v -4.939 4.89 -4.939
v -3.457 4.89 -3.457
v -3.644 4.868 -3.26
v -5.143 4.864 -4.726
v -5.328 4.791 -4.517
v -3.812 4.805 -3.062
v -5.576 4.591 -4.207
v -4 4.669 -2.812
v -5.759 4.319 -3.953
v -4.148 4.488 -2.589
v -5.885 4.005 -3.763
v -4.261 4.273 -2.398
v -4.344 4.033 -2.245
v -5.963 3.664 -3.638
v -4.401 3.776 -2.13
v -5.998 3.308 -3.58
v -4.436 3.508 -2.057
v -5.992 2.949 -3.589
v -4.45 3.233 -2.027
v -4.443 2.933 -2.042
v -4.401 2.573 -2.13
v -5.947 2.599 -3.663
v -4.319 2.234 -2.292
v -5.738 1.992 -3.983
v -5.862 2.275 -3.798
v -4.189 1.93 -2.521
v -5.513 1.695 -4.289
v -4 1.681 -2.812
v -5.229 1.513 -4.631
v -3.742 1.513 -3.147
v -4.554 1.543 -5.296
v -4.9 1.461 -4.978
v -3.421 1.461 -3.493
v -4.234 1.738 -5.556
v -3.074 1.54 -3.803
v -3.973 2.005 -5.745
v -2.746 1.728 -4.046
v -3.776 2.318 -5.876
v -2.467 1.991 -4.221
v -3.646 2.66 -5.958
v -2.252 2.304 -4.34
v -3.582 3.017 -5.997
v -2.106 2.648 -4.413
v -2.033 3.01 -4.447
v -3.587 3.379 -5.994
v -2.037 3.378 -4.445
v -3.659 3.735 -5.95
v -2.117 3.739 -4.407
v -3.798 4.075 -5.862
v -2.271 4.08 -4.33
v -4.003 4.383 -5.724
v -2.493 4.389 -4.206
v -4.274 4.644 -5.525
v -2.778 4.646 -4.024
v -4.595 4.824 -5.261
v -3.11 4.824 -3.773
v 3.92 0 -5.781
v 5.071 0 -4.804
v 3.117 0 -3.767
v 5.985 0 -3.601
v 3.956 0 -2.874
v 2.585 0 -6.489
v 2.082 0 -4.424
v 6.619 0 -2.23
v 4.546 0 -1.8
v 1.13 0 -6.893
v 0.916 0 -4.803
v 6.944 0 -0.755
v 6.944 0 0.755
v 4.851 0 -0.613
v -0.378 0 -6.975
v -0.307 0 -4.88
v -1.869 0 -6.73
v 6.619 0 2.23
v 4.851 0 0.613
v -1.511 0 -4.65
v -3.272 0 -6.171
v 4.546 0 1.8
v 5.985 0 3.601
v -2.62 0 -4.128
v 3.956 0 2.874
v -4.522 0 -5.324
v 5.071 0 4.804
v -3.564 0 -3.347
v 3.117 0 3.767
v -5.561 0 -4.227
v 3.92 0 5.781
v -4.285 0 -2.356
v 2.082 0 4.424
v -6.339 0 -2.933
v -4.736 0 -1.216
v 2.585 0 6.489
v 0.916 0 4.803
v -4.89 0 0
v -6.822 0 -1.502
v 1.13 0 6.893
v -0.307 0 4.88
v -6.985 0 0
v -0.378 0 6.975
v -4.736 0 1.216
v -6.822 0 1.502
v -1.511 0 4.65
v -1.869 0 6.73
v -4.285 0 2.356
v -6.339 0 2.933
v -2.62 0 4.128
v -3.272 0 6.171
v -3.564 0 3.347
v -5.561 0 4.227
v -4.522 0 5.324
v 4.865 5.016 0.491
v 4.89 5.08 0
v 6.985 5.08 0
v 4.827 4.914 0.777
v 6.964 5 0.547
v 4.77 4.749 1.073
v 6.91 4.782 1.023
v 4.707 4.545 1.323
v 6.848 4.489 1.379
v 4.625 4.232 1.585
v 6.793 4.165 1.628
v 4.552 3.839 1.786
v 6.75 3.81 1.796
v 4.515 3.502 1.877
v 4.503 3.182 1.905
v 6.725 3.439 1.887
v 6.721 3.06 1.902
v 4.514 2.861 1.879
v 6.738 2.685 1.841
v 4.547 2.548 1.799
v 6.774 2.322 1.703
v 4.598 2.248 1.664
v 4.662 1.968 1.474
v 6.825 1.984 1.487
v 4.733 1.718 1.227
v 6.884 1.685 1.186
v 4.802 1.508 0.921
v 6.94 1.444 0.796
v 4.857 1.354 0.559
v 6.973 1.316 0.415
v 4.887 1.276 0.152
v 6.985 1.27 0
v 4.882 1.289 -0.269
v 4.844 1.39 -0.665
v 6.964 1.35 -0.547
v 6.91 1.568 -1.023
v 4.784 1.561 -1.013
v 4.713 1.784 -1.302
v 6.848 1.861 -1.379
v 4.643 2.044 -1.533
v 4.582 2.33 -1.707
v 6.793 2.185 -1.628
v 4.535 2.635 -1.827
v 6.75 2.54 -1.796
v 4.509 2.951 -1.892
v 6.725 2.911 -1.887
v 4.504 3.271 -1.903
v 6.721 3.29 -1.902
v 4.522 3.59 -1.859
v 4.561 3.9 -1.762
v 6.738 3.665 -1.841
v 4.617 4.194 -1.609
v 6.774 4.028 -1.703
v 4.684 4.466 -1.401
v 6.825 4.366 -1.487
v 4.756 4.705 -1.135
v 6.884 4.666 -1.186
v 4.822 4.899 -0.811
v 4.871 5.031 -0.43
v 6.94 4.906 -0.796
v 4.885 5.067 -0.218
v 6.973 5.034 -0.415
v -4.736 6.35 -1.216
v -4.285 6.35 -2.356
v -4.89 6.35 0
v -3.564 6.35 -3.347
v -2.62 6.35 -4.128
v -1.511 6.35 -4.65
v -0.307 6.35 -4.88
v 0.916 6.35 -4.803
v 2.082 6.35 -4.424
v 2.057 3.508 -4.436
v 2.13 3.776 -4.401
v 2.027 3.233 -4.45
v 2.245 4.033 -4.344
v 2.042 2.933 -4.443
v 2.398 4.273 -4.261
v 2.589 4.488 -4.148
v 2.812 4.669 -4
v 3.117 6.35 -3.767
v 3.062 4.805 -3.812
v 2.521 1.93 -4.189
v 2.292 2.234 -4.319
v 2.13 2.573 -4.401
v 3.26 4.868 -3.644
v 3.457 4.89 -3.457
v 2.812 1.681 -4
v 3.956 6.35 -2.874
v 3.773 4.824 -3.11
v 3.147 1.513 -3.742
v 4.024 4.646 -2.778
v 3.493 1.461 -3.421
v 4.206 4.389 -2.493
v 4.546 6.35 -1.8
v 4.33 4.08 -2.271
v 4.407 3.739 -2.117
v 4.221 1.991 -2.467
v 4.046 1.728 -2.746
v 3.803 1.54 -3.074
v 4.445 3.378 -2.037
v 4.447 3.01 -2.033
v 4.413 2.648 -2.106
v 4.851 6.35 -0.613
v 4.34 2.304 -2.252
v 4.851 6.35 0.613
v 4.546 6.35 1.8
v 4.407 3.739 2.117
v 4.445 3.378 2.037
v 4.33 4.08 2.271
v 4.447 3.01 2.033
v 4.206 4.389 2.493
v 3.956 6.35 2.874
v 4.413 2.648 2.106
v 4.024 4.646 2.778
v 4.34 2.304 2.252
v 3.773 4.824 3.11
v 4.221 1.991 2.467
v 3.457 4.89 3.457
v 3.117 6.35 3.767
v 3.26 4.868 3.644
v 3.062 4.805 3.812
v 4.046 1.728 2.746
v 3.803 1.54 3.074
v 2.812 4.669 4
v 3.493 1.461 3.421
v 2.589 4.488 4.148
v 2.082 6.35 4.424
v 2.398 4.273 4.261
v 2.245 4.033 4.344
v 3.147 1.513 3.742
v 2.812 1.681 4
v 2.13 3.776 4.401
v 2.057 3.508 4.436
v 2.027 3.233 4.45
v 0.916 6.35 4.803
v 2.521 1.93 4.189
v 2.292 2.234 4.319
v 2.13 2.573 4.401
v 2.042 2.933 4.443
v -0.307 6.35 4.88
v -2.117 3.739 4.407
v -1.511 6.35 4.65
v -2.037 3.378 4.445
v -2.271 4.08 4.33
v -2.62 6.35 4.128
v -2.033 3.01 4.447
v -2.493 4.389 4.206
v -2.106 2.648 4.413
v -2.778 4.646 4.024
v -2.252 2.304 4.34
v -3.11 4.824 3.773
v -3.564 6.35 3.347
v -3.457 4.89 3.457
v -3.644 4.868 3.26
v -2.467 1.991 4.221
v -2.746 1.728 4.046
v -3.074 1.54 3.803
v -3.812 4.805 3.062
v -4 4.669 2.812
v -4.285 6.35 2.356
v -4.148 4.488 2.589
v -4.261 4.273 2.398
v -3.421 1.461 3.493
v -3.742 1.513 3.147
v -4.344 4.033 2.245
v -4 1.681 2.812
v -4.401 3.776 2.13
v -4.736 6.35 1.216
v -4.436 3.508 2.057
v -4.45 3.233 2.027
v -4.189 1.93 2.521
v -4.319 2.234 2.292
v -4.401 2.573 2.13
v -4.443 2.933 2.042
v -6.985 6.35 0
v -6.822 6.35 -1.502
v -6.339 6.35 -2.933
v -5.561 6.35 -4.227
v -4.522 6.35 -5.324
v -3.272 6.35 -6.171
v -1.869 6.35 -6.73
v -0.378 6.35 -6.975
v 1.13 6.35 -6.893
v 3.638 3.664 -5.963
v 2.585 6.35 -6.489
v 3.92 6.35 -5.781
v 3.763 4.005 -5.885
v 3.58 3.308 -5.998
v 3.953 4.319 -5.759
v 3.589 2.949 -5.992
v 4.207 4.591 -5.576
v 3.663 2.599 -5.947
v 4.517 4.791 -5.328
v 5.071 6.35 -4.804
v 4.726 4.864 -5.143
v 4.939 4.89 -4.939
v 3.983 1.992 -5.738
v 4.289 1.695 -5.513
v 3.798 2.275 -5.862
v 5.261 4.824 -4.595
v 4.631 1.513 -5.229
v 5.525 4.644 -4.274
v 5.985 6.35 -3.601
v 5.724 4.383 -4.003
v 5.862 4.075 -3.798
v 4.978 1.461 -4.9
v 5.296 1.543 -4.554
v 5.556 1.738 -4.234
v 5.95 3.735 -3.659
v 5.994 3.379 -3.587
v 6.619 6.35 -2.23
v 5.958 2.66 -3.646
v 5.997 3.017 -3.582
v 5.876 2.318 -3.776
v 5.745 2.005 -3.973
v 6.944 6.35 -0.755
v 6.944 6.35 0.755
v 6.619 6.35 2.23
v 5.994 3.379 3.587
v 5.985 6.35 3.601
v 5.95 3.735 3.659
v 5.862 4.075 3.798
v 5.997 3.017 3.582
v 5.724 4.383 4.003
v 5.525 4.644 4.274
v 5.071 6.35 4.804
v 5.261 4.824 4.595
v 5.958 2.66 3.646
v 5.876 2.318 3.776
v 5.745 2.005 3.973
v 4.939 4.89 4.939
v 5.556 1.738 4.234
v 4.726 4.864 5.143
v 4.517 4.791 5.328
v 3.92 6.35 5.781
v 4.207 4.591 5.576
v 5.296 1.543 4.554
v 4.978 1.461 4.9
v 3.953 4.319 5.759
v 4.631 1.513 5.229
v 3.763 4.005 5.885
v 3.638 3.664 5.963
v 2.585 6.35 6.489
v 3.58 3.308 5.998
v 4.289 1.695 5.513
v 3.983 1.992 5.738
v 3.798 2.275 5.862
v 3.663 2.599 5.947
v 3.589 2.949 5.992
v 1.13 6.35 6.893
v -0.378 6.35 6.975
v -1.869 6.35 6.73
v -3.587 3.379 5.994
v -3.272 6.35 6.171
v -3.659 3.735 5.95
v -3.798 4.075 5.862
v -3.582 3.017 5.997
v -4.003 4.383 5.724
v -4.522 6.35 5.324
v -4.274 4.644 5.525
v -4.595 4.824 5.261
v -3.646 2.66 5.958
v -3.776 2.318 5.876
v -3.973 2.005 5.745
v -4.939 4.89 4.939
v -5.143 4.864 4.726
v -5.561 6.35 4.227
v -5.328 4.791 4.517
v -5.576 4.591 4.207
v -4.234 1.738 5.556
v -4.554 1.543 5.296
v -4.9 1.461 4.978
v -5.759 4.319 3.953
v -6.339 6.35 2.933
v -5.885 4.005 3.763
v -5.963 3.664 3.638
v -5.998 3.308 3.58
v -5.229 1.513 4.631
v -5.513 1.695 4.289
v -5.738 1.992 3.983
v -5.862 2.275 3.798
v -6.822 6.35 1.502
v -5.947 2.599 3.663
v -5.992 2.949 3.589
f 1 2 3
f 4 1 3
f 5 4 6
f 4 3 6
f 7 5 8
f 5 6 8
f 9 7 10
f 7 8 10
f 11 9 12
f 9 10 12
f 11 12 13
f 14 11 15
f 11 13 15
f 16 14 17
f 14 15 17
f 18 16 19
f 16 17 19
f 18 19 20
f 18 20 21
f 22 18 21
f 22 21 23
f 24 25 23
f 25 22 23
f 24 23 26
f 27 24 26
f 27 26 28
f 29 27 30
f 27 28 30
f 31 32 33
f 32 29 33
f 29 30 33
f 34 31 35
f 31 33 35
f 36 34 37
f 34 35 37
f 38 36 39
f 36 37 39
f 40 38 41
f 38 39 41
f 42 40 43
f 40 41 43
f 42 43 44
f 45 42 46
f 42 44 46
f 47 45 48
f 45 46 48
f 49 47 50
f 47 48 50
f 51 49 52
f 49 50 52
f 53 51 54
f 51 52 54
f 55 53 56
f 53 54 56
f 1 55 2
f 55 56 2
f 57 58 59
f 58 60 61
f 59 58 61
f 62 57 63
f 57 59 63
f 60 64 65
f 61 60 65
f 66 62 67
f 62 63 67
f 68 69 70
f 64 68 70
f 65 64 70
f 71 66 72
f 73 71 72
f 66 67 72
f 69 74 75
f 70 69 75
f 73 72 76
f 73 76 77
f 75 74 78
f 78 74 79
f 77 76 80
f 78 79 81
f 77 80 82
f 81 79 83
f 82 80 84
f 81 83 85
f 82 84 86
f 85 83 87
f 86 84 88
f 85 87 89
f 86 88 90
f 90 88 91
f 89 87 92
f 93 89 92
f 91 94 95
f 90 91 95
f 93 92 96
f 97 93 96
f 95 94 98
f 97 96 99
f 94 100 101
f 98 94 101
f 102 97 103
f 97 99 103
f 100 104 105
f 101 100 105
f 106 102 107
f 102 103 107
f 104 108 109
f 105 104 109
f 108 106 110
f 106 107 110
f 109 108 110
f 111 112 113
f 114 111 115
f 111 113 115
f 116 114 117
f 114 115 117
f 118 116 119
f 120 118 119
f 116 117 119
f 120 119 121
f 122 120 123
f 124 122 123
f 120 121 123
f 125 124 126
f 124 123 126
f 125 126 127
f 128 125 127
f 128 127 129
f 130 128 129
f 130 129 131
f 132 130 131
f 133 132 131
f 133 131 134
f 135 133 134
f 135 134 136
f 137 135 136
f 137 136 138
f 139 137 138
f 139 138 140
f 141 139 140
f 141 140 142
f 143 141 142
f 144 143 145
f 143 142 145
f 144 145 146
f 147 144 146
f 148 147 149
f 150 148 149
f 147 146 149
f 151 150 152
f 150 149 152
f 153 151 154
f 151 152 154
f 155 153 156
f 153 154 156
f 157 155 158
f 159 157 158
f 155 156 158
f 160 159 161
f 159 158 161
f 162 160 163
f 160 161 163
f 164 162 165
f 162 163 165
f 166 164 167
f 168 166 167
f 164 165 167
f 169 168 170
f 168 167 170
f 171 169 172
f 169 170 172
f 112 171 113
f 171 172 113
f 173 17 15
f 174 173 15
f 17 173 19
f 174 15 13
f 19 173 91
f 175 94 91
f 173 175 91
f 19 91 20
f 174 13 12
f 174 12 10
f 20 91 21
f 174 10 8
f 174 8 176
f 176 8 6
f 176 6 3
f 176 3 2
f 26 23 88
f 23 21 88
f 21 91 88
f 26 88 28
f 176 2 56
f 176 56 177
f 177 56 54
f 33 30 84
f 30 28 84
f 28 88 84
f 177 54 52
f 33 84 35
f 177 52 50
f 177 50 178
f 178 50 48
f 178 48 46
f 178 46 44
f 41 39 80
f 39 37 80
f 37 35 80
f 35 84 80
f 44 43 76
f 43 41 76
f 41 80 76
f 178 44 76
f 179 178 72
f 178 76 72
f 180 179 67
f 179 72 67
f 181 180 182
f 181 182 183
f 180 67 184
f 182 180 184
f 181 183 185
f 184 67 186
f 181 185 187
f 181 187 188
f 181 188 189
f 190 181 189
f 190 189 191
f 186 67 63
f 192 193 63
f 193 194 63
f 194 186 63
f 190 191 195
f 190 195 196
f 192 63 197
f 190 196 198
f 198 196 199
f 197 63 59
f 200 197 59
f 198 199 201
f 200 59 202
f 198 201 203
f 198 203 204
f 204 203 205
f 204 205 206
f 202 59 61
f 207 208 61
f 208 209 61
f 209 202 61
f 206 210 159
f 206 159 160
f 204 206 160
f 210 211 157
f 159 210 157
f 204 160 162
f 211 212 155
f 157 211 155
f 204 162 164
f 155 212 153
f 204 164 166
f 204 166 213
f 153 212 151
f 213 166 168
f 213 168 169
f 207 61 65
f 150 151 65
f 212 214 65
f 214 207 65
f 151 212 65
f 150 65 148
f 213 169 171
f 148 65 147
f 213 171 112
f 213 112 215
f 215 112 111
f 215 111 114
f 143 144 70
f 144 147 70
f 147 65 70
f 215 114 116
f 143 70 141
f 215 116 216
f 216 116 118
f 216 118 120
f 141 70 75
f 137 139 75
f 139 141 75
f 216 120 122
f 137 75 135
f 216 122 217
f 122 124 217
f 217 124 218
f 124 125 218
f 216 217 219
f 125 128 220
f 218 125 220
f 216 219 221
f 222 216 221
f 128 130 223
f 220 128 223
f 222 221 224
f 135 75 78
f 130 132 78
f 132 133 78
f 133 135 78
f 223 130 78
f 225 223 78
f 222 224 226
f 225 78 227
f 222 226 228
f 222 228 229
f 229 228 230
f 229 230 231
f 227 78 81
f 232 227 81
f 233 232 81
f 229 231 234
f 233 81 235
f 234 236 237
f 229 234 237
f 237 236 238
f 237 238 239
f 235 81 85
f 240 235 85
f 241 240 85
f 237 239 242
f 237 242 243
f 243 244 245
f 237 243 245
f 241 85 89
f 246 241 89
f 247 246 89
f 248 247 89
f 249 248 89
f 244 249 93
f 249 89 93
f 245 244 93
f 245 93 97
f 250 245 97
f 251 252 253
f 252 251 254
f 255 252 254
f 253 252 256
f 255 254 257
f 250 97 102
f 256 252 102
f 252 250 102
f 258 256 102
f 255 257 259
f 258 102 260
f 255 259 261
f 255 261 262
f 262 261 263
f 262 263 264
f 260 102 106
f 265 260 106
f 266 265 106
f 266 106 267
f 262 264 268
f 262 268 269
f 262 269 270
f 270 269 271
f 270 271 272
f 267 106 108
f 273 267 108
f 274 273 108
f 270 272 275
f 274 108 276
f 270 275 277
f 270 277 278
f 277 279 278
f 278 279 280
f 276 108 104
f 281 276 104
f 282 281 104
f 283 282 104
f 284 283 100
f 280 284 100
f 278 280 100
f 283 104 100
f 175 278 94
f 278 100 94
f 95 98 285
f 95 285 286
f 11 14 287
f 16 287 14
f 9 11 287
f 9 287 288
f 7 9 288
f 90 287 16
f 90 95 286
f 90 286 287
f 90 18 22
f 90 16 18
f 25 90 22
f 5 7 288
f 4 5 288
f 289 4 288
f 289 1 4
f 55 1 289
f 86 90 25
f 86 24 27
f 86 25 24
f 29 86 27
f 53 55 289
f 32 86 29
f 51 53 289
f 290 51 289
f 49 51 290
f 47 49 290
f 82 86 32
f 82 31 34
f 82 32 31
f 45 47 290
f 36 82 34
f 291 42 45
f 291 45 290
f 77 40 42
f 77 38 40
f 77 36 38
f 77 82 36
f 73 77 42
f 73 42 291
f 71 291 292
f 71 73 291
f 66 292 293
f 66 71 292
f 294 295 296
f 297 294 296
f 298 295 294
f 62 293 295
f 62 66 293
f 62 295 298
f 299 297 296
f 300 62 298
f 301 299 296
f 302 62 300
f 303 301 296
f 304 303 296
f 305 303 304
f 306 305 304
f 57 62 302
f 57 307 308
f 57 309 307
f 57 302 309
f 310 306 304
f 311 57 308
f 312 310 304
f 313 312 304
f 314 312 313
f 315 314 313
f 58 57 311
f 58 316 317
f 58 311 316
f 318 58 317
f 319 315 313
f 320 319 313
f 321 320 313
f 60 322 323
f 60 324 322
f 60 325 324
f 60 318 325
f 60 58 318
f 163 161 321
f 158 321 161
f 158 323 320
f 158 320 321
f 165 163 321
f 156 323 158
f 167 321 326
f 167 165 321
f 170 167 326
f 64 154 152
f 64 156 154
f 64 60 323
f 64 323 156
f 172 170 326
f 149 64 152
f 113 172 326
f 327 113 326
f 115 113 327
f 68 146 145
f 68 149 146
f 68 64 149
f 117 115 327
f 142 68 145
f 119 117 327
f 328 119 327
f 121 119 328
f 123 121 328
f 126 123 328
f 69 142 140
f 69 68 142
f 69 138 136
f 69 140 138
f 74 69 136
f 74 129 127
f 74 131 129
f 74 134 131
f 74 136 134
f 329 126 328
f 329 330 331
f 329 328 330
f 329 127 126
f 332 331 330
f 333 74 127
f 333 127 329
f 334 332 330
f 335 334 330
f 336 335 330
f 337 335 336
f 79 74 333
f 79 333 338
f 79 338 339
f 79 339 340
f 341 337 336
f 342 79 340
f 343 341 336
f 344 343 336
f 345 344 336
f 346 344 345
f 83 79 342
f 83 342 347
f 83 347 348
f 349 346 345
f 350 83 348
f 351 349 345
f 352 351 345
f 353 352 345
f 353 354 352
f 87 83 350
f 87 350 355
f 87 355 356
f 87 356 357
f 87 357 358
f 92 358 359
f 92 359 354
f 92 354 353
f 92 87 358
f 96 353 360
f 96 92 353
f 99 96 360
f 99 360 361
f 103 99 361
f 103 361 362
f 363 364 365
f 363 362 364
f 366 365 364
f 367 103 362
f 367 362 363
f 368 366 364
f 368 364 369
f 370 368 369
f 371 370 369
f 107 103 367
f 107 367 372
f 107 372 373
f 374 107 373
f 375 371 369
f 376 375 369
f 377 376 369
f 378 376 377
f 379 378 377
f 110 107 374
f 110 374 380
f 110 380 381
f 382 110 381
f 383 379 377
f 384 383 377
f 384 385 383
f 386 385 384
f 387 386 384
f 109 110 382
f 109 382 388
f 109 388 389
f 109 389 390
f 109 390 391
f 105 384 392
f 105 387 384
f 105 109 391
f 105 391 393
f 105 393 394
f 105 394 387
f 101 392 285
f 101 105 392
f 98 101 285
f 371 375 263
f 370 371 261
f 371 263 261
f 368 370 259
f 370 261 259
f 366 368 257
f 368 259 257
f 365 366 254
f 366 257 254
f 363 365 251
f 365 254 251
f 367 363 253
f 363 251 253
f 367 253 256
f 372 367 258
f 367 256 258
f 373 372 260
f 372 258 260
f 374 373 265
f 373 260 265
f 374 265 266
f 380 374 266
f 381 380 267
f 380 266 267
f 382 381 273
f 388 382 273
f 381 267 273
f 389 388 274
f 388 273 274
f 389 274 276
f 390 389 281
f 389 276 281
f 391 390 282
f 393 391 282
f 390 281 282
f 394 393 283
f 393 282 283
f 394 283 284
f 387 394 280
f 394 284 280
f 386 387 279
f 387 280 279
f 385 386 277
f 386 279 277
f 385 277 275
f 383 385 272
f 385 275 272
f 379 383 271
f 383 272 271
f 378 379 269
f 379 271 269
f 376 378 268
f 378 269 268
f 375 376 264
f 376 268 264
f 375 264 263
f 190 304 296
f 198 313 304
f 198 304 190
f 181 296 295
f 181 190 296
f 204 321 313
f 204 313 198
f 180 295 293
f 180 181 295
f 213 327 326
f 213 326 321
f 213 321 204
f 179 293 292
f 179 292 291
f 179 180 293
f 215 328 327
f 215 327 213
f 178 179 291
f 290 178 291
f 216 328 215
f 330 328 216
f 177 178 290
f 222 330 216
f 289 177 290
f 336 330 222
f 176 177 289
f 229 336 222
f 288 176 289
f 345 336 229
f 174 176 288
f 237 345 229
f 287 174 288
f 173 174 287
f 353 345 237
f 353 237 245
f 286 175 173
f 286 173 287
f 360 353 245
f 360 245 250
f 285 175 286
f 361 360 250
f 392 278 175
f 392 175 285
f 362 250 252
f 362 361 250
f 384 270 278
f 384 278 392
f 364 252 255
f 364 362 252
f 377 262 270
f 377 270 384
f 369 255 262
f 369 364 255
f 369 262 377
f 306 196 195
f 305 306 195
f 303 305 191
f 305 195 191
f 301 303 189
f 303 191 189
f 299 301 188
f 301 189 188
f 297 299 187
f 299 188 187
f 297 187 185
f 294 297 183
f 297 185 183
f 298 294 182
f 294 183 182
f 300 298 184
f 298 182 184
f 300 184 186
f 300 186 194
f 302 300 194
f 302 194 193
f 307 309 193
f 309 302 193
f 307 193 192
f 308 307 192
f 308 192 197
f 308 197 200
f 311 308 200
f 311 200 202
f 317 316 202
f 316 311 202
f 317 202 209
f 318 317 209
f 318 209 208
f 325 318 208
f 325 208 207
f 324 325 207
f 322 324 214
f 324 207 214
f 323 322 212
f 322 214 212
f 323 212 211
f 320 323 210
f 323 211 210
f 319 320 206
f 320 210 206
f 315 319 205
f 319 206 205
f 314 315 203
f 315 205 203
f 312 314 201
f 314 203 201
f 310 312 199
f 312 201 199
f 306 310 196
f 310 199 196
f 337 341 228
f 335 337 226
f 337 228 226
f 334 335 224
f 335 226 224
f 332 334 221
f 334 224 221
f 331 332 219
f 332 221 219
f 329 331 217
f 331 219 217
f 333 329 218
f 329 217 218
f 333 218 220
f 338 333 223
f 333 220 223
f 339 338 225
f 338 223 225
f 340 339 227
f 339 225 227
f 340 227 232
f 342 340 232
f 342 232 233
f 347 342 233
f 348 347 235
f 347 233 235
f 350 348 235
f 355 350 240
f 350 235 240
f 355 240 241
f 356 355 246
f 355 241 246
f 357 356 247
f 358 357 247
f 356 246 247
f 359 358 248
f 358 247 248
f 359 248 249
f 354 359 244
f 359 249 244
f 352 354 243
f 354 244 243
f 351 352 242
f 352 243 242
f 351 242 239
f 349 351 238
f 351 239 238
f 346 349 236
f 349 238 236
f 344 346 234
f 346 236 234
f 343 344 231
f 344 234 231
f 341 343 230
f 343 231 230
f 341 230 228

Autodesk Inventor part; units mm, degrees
ref_plane "XZ Plane" through (0, 0, 0) normal (0, 1, 0) x (-1, 0, 0)
sketch "Sketch1" plane through (0, 0, 0) normal (0, 1, 0) x (-1, 0, 0)
  circle A0 centre (0, 0) radius 4.8895
  circle A1 centre (0, 0) radius 6.985
  dimension "d0" = 9.779
  dimension "d1" = 13.97
extrude "Extrusion1" add sketch "Sketch1" along normal blind 6.35
ref_plane "Work Plane1" through (6.985, 0, 0) normal (1, 0, 0) x (0, 1, 0)
sketch "Sketch2" plane through (6.985, 0, 0) normal (1, 0, 0) x (0, 1, 0)
  circle A0 centre (3.175, 0) radius 1.905
  line L0 (0, -6.985) -> (6.35, -6.985) projected
  point P0 (0, 0)
  point P1 (3.175, -6.985)
  dimension "d4" = 3.81
extrude "Extrusion2" cut sketch "Sketch2" against normal blind 6.35
ref_plane "Work Plane2" through (0, 0, 0) normal (0.7071, 0, -0.7071) x (0, 1, 0)
sketch "Sketch4" plane through (0, 0, 0) normal (0.7071, 0, -0.7071) x (0, 1, 0)
  circle A0 centre (3.175, 0) radius 1.7145
  line L0 (0, -6.985) -> (6.35, -6.985) projected
  point P0 (0, 0)
  point P1 (3.175, -6.985)
  dimension "d11" = 3.429
extrude "Extrusion4" cut sketch "Sketch4" along normal through all both and the other way through all
pattern_circular "Circular Pattern1" count 2 over 90 about axis through (0, 0, 0) along (0, 1, 0) of "Extrusion4"
properties part number "SpoolCarrageMagnetMount" material "ABS Plastic"
